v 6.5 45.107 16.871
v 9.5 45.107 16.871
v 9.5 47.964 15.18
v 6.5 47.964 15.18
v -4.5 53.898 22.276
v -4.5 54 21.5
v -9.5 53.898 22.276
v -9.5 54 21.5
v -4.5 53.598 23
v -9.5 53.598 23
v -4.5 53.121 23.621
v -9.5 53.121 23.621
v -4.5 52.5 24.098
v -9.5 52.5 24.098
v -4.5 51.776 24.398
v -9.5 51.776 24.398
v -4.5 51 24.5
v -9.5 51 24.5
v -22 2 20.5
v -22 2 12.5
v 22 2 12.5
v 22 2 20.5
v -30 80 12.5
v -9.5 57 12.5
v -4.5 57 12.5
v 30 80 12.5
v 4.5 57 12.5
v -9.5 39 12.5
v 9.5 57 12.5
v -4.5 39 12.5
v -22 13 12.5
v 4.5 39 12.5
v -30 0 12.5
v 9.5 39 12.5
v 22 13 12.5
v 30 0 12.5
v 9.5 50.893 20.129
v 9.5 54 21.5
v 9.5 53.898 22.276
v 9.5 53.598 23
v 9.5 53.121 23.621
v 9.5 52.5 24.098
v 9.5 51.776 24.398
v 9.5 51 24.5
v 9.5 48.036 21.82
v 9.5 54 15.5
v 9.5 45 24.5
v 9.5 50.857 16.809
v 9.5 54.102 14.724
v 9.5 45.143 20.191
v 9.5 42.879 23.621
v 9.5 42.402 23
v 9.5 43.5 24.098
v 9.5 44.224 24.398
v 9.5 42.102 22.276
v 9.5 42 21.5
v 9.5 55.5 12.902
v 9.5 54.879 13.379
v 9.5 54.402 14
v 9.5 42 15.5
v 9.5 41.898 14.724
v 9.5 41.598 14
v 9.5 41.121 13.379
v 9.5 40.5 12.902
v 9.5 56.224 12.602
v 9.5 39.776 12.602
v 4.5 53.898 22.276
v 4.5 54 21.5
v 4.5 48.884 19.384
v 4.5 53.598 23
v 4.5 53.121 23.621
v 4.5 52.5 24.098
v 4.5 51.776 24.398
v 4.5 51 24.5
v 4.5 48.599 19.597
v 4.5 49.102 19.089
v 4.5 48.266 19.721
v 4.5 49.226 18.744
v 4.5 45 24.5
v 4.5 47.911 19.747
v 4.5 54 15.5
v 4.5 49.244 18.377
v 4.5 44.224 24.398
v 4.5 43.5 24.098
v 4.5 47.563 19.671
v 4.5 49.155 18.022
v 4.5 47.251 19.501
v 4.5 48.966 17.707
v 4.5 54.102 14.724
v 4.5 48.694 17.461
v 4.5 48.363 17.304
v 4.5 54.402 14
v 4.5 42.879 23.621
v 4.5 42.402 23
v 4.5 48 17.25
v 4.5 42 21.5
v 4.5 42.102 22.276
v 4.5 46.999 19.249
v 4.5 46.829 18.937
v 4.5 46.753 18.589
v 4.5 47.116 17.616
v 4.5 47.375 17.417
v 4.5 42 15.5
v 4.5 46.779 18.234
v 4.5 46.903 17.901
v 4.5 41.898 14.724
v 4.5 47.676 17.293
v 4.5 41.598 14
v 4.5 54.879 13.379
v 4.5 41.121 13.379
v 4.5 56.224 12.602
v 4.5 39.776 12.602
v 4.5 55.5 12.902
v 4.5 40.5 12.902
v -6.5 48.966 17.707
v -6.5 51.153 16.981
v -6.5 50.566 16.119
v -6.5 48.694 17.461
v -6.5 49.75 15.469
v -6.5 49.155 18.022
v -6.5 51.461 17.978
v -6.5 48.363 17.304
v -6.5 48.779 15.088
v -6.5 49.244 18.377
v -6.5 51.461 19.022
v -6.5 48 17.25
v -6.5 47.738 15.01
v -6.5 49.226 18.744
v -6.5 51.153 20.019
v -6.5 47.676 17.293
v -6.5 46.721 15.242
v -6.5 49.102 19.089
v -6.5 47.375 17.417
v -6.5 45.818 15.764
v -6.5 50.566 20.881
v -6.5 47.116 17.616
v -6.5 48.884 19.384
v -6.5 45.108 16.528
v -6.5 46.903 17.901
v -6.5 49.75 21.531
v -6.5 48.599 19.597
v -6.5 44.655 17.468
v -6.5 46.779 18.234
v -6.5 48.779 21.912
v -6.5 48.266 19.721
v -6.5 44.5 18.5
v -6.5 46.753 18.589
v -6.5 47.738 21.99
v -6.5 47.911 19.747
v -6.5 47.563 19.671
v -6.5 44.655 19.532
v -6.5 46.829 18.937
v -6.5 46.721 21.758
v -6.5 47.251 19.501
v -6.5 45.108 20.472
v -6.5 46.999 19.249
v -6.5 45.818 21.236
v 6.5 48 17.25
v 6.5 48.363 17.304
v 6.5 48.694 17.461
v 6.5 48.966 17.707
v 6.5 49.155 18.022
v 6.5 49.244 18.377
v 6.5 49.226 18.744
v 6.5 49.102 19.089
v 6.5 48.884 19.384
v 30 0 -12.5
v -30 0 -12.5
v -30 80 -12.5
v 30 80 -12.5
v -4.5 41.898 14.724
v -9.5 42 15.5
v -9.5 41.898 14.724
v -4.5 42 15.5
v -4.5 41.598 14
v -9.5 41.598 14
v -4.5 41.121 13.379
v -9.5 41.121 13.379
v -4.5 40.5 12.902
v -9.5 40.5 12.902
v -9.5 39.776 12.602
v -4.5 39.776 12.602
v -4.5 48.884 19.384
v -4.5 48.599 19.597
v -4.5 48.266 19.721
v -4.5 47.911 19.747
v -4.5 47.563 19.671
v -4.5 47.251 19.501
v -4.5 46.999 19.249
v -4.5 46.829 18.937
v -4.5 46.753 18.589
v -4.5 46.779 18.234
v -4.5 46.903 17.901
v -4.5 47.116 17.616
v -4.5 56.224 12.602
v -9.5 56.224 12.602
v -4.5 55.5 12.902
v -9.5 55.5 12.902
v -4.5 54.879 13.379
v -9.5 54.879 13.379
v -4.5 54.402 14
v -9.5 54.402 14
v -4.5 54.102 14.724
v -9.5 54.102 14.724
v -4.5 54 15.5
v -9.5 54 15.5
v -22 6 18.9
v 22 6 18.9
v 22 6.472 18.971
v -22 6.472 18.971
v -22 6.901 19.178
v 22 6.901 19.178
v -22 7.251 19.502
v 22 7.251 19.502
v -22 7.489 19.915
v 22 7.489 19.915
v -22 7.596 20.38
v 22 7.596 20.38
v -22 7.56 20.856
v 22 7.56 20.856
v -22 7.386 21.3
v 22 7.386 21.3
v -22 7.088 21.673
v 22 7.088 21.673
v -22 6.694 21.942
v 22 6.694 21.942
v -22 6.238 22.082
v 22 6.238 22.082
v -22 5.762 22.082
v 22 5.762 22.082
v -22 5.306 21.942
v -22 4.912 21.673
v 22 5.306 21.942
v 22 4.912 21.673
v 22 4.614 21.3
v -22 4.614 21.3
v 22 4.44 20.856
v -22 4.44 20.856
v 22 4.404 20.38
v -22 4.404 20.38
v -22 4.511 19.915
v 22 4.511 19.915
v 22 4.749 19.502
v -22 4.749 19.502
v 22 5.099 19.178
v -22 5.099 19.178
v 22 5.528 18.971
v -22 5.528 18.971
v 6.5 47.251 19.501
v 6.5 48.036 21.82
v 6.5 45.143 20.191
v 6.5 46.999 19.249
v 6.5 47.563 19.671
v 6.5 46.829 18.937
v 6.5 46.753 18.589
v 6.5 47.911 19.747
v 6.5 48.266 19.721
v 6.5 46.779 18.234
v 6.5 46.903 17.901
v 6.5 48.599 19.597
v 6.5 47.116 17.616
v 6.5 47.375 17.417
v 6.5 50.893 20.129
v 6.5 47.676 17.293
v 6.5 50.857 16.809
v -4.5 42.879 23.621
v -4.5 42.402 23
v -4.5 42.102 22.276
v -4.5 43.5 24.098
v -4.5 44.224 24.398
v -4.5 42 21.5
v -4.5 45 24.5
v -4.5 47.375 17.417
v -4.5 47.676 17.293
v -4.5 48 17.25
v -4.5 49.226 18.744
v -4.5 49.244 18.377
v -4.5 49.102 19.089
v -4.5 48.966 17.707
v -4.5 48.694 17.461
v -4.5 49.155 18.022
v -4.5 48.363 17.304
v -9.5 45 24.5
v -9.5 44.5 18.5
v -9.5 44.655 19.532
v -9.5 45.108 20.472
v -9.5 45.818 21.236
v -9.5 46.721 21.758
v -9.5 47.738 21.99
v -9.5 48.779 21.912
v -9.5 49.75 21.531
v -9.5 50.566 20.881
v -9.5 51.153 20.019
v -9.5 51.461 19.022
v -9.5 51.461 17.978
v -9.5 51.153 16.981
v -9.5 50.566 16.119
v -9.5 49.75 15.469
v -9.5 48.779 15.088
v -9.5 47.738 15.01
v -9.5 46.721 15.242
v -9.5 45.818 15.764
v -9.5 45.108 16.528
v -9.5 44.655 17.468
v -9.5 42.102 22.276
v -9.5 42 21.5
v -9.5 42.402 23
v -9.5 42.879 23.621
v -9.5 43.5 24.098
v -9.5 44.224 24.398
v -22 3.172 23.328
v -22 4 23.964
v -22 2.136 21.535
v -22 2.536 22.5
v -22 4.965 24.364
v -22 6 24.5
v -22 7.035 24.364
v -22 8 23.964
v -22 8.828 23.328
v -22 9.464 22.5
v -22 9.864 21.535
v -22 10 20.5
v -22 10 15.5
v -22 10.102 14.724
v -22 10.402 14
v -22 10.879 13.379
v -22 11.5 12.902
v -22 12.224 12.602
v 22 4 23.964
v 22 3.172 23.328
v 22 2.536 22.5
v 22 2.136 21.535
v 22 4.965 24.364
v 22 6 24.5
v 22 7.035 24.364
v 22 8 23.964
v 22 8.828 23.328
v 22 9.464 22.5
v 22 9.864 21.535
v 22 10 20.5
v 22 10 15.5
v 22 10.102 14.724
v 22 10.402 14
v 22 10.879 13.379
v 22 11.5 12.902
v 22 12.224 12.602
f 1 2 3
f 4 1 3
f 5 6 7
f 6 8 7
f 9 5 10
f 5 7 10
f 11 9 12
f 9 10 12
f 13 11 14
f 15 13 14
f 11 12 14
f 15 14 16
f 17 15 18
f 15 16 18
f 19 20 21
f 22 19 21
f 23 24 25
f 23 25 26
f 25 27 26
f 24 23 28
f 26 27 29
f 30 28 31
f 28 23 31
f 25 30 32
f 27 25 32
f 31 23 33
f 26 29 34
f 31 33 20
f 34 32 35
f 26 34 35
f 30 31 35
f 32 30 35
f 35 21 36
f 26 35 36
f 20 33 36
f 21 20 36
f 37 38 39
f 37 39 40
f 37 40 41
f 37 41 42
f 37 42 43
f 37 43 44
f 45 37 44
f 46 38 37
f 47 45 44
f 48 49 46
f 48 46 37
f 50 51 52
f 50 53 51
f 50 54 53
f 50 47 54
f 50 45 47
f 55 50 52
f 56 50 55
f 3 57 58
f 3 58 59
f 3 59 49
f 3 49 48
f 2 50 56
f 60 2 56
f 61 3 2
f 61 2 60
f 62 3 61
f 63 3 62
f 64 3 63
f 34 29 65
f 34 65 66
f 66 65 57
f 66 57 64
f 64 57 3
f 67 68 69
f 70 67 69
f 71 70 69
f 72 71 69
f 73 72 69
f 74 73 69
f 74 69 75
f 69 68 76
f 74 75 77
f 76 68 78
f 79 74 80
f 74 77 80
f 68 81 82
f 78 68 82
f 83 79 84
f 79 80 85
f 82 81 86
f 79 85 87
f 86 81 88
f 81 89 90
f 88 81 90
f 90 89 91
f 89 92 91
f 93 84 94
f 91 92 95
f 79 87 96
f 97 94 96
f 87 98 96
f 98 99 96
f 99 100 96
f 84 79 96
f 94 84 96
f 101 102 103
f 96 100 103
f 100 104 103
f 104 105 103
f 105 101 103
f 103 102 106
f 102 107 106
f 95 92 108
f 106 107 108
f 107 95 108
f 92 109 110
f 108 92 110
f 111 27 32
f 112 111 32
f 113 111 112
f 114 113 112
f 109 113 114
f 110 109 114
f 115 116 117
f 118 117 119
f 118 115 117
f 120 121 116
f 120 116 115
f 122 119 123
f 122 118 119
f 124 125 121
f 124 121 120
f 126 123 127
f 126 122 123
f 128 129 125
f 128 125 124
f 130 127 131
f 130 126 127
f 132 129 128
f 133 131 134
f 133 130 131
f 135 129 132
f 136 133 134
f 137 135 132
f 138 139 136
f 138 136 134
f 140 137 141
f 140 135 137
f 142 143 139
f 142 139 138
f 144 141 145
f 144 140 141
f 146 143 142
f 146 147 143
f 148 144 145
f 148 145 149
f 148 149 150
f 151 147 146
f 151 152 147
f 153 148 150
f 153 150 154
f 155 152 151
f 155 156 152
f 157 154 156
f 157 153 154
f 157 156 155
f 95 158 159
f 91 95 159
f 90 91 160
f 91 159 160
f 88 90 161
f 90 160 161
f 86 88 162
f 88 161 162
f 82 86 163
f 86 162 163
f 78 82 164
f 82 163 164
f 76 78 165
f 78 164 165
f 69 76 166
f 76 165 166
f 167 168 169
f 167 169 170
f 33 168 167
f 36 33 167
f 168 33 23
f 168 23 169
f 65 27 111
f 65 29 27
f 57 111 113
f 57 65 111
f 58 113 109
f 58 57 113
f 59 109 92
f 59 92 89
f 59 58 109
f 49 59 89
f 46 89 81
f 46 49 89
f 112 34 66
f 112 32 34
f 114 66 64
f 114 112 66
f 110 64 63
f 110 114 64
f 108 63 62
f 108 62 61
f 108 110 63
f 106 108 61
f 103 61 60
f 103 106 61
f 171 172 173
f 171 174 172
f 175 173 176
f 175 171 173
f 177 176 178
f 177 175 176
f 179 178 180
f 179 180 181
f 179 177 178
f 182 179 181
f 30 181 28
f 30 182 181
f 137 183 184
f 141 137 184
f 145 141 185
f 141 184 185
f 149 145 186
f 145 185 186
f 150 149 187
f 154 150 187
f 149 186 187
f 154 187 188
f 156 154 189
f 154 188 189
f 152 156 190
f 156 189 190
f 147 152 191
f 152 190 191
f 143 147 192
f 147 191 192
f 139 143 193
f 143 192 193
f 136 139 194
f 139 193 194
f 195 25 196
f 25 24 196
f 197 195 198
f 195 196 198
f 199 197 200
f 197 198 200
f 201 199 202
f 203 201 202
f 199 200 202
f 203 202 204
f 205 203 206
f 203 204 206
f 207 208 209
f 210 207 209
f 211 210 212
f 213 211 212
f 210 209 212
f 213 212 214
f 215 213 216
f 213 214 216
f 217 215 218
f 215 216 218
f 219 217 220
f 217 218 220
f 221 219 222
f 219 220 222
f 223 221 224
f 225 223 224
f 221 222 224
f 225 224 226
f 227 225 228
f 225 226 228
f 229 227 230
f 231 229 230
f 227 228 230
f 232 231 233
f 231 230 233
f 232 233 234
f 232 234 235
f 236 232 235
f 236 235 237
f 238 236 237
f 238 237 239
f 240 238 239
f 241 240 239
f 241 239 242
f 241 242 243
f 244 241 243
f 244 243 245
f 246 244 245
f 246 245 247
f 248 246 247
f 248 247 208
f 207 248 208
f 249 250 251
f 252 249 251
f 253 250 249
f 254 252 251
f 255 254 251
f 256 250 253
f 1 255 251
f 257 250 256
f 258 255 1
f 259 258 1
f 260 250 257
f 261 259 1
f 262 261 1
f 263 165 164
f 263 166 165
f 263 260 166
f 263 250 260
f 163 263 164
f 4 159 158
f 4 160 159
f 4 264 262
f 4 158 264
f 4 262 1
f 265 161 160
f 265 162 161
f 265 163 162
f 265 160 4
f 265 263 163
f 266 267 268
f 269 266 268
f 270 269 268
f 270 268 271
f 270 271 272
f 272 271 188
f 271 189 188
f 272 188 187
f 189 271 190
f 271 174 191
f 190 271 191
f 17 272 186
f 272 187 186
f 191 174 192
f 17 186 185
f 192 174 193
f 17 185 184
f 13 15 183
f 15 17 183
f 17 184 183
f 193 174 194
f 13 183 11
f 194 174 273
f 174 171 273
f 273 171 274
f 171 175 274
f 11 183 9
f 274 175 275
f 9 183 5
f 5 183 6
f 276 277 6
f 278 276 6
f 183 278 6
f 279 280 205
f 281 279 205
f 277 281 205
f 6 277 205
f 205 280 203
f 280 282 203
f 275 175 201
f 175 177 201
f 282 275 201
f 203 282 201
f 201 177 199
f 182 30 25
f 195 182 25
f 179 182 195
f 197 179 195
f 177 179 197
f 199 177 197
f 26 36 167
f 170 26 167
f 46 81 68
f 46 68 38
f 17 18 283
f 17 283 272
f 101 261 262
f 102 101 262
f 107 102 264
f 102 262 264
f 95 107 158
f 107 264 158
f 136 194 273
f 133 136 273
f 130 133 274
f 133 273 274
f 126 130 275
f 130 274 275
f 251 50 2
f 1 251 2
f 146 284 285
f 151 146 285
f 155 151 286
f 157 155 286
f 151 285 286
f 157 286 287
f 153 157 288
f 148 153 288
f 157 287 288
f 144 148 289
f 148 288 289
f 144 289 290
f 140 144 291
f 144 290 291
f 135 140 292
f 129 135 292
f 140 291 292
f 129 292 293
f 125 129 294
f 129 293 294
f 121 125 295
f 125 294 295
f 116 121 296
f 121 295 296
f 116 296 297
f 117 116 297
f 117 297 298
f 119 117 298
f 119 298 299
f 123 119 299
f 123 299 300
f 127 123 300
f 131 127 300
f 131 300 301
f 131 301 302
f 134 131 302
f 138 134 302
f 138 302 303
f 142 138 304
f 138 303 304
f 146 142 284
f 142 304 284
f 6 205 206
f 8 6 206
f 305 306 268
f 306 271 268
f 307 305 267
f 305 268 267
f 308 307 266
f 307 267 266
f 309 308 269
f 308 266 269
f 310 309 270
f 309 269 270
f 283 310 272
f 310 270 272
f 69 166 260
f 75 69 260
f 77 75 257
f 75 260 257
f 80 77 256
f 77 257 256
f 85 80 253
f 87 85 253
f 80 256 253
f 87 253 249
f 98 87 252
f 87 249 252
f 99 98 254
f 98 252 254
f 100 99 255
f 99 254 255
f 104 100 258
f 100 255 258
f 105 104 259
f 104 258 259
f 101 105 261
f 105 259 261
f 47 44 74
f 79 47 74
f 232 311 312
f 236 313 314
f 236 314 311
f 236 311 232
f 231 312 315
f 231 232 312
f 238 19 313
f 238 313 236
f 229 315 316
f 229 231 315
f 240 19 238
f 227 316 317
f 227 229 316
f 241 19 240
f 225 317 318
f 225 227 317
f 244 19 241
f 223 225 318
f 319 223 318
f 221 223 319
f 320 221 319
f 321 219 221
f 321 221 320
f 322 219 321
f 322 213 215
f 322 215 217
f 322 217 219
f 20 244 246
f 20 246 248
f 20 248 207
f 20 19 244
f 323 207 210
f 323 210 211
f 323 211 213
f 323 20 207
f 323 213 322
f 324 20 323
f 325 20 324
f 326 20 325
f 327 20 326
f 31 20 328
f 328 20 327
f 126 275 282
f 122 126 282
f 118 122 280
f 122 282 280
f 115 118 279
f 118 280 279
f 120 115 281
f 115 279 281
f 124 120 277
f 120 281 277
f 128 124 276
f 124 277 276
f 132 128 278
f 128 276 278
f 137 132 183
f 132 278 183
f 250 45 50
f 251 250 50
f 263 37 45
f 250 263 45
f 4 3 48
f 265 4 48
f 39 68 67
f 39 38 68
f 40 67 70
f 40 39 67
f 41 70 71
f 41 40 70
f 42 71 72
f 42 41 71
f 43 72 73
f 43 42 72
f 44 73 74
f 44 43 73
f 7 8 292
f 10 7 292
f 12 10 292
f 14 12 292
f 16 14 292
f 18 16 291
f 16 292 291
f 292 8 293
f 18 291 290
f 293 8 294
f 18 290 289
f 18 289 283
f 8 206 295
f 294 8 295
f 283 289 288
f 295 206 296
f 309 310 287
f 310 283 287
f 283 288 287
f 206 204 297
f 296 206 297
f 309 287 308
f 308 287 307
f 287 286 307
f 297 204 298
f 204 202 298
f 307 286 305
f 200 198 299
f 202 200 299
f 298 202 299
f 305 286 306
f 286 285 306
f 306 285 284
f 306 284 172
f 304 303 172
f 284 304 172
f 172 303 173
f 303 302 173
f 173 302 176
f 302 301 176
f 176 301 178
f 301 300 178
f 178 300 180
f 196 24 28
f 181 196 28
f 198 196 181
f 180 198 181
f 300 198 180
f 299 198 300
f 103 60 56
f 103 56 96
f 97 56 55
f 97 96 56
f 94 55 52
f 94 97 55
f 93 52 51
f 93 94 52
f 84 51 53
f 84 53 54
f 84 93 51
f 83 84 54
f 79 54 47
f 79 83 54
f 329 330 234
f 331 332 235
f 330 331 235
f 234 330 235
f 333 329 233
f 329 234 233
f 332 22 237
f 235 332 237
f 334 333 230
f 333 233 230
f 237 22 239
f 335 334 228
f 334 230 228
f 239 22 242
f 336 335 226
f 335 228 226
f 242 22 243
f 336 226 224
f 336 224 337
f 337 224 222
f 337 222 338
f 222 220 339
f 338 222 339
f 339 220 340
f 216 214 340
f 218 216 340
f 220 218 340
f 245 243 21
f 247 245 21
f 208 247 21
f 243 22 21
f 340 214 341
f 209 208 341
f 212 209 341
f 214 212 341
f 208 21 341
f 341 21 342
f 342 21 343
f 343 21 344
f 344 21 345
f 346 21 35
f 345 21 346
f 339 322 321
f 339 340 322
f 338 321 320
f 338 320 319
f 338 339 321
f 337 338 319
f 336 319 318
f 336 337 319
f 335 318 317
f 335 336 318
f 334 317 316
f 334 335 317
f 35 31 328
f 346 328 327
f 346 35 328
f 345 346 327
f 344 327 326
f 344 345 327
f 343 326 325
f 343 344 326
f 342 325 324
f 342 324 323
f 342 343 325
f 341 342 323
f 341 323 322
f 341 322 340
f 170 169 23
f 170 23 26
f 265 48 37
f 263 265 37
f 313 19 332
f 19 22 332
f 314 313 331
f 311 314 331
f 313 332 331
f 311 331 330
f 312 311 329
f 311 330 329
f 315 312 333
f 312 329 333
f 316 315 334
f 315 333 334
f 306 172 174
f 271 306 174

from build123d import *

# Parameters (mm, degrees)
SKETCH1_W           = 60
SKETCH1_H           = 25
BOSS_EXTRUDE1_DEPTH = 80
SKETCH2_W           = 44
SKETCH2_H           = 8
BOSS_EXTRUDE2_DEPTH = 12
SKETCH3_R           = 1.6
CUT_EXTRUDE1_DEPTH  = 99.510151761
FILLET1_R           = 4
CUT_EXTRUDE2_DEPTH  = 93.522970121
CUT_EXTRUDE3_DEPTH  = 3
SKETCH6_R           = 3.5
CUT_EXTRUDE4_DEPTH  = 3
FILLET2_R           = 3
FILLET3_R           = 3


with BuildPart() as part:
    # Sketch1 → Boss-Extrude1 (new body)
    with BuildSketch(Plane(origin=(0, 0, 0), x_dir=(1, 0, 0), z_dir=(0, 1, 0))):
        Rectangle(SKETCH1_W, SKETCH1_H)
    extrude(amount=BOSS_EXTRUDE1_DEPTH)

    # Sketch2 → Boss-Extrude2 (add)
    with BuildSketch(Plane.XY.offset(12.5)):
        with Locations((0, 6)):
            Rectangle(SKETCH2_W, SKETCH2_H)
        Polygon((-4.5, 48), (-4.5, 54), (-9.5, 54), (-9.5, 42), (-4.5, 42), align=None)
        Polygon((4.5, 48), (4.5, 54), (9.5, 54), (9.5, 42), (4.5, 42), align=None)
    extrude(amount=BOSS_EXTRUDE2_DEPTH)

    # Sketch3 → Cut-Extrude1 (cut, through all)
    with BuildSketch(Plane(origin=(22, 0, 0), x_dir=(0, 0, -1), z_dir=(1, 0, 0))):
        with Locations((-20.5, 6)):
            Circle(SKETCH3_R)
    extrude(amount=-CUT_EXTRUDE1_DEPTH, mode=Mode.SUBTRACT)

    # Fillet1
    fillet1_edges = [part.edges().sort_by_distance(p)[0] for p in [
        (0, 2, 24.5),
        (0, 10, 24.5),
    ]]
    fillet(fillet1_edges, radius=FILLET1_R - 0.0001)  # a hair under: the kernel refuses the full size

    # Sketch4 → Cut-Extrude2 (cut, through all)
    with BuildSketch(Plane(origin=(9.5, 0, 0), x_dir=(0, 0, -1), z_dir=(1, 0, 0))):
        with BuildLine():
            ThreePointArc((-17.25, 48), (-18.02164571, 49.154849416), (-19.383883476, 48.883883476))
            Line((-19.383883476, 48.883883476), (-17.616116524, 47.116116524))
            ThreePointArc((-17.616116524, 47.116116524), (-17.345150584, 47.52164571), (-17.25, 48))
        make_face()
        with BuildLine():
            Line((-17.616116524, 47.116116524), (-19.383883476, 48.883883476))
            ThreePointArc((-19.383883476, 48.883883476), (-19.383883476, 47.116116524), (-17.616116524, 47.116116524))
        make_face()
    extrude(amount=-CUT_EXTRUDE2_DEPTH, mode=Mode.SUBTRACT)

    # Sketch5 → Cut-Extrude3 (cut)
    with BuildSketch(Plane(origin=(9.5, 0, 0), x_dir=(0, 0, -1), z_dir=(1, 0, 0))):
        Polygon((-16.871380461, 45.107175821), (-15.180431003, 47.964013804), (-16.809050541, 50.856837983), (-20.128619539, 50.892824179), (-21.819568997, 48.035986196), (-20.190949459, 45.143162017), align=None)
    extrude(amount=-CUT_EXTRUDE3_DEPTH, mode=Mode.SUBTRACT)

    # Sketch6 → Cut-Extrude4 (cut)
    with BuildSketch(Plane.ZY.offset(9.5)):
        with Locations(Location((18.5, 48, 0), (0, 0, 270))):
            Circle(SKETCH6_R)
    extrude(amount=-CUT_EXTRUDE4_DEPTH, mode=Mode.SUBTRACT)

    # Fillet2
    fillet2_edges = [part.edges().sort_by_distance(p)[0] for p in [
        (-7, 54, 24.5),
        (-7, 42, 24.5),
        (7, 42, 24.5),
        (7, 54, 24.5),
    ]]
    fillet(fillet2_edges, radius=FILLET2_R)

    # Fillet3
    fillet3_edges = [part.edges().sort_by_distance(p)[0] for p in [
        (0, 10, 12.5),
        (-7, 54, 12.5),
        (-7, 42, 12.5),
        (7, 42, 12.5),
        (7, 54, 12.5),
    ]]
    fillet(fillet3_edges, radius=FILLET3_R)


solid = part.part
